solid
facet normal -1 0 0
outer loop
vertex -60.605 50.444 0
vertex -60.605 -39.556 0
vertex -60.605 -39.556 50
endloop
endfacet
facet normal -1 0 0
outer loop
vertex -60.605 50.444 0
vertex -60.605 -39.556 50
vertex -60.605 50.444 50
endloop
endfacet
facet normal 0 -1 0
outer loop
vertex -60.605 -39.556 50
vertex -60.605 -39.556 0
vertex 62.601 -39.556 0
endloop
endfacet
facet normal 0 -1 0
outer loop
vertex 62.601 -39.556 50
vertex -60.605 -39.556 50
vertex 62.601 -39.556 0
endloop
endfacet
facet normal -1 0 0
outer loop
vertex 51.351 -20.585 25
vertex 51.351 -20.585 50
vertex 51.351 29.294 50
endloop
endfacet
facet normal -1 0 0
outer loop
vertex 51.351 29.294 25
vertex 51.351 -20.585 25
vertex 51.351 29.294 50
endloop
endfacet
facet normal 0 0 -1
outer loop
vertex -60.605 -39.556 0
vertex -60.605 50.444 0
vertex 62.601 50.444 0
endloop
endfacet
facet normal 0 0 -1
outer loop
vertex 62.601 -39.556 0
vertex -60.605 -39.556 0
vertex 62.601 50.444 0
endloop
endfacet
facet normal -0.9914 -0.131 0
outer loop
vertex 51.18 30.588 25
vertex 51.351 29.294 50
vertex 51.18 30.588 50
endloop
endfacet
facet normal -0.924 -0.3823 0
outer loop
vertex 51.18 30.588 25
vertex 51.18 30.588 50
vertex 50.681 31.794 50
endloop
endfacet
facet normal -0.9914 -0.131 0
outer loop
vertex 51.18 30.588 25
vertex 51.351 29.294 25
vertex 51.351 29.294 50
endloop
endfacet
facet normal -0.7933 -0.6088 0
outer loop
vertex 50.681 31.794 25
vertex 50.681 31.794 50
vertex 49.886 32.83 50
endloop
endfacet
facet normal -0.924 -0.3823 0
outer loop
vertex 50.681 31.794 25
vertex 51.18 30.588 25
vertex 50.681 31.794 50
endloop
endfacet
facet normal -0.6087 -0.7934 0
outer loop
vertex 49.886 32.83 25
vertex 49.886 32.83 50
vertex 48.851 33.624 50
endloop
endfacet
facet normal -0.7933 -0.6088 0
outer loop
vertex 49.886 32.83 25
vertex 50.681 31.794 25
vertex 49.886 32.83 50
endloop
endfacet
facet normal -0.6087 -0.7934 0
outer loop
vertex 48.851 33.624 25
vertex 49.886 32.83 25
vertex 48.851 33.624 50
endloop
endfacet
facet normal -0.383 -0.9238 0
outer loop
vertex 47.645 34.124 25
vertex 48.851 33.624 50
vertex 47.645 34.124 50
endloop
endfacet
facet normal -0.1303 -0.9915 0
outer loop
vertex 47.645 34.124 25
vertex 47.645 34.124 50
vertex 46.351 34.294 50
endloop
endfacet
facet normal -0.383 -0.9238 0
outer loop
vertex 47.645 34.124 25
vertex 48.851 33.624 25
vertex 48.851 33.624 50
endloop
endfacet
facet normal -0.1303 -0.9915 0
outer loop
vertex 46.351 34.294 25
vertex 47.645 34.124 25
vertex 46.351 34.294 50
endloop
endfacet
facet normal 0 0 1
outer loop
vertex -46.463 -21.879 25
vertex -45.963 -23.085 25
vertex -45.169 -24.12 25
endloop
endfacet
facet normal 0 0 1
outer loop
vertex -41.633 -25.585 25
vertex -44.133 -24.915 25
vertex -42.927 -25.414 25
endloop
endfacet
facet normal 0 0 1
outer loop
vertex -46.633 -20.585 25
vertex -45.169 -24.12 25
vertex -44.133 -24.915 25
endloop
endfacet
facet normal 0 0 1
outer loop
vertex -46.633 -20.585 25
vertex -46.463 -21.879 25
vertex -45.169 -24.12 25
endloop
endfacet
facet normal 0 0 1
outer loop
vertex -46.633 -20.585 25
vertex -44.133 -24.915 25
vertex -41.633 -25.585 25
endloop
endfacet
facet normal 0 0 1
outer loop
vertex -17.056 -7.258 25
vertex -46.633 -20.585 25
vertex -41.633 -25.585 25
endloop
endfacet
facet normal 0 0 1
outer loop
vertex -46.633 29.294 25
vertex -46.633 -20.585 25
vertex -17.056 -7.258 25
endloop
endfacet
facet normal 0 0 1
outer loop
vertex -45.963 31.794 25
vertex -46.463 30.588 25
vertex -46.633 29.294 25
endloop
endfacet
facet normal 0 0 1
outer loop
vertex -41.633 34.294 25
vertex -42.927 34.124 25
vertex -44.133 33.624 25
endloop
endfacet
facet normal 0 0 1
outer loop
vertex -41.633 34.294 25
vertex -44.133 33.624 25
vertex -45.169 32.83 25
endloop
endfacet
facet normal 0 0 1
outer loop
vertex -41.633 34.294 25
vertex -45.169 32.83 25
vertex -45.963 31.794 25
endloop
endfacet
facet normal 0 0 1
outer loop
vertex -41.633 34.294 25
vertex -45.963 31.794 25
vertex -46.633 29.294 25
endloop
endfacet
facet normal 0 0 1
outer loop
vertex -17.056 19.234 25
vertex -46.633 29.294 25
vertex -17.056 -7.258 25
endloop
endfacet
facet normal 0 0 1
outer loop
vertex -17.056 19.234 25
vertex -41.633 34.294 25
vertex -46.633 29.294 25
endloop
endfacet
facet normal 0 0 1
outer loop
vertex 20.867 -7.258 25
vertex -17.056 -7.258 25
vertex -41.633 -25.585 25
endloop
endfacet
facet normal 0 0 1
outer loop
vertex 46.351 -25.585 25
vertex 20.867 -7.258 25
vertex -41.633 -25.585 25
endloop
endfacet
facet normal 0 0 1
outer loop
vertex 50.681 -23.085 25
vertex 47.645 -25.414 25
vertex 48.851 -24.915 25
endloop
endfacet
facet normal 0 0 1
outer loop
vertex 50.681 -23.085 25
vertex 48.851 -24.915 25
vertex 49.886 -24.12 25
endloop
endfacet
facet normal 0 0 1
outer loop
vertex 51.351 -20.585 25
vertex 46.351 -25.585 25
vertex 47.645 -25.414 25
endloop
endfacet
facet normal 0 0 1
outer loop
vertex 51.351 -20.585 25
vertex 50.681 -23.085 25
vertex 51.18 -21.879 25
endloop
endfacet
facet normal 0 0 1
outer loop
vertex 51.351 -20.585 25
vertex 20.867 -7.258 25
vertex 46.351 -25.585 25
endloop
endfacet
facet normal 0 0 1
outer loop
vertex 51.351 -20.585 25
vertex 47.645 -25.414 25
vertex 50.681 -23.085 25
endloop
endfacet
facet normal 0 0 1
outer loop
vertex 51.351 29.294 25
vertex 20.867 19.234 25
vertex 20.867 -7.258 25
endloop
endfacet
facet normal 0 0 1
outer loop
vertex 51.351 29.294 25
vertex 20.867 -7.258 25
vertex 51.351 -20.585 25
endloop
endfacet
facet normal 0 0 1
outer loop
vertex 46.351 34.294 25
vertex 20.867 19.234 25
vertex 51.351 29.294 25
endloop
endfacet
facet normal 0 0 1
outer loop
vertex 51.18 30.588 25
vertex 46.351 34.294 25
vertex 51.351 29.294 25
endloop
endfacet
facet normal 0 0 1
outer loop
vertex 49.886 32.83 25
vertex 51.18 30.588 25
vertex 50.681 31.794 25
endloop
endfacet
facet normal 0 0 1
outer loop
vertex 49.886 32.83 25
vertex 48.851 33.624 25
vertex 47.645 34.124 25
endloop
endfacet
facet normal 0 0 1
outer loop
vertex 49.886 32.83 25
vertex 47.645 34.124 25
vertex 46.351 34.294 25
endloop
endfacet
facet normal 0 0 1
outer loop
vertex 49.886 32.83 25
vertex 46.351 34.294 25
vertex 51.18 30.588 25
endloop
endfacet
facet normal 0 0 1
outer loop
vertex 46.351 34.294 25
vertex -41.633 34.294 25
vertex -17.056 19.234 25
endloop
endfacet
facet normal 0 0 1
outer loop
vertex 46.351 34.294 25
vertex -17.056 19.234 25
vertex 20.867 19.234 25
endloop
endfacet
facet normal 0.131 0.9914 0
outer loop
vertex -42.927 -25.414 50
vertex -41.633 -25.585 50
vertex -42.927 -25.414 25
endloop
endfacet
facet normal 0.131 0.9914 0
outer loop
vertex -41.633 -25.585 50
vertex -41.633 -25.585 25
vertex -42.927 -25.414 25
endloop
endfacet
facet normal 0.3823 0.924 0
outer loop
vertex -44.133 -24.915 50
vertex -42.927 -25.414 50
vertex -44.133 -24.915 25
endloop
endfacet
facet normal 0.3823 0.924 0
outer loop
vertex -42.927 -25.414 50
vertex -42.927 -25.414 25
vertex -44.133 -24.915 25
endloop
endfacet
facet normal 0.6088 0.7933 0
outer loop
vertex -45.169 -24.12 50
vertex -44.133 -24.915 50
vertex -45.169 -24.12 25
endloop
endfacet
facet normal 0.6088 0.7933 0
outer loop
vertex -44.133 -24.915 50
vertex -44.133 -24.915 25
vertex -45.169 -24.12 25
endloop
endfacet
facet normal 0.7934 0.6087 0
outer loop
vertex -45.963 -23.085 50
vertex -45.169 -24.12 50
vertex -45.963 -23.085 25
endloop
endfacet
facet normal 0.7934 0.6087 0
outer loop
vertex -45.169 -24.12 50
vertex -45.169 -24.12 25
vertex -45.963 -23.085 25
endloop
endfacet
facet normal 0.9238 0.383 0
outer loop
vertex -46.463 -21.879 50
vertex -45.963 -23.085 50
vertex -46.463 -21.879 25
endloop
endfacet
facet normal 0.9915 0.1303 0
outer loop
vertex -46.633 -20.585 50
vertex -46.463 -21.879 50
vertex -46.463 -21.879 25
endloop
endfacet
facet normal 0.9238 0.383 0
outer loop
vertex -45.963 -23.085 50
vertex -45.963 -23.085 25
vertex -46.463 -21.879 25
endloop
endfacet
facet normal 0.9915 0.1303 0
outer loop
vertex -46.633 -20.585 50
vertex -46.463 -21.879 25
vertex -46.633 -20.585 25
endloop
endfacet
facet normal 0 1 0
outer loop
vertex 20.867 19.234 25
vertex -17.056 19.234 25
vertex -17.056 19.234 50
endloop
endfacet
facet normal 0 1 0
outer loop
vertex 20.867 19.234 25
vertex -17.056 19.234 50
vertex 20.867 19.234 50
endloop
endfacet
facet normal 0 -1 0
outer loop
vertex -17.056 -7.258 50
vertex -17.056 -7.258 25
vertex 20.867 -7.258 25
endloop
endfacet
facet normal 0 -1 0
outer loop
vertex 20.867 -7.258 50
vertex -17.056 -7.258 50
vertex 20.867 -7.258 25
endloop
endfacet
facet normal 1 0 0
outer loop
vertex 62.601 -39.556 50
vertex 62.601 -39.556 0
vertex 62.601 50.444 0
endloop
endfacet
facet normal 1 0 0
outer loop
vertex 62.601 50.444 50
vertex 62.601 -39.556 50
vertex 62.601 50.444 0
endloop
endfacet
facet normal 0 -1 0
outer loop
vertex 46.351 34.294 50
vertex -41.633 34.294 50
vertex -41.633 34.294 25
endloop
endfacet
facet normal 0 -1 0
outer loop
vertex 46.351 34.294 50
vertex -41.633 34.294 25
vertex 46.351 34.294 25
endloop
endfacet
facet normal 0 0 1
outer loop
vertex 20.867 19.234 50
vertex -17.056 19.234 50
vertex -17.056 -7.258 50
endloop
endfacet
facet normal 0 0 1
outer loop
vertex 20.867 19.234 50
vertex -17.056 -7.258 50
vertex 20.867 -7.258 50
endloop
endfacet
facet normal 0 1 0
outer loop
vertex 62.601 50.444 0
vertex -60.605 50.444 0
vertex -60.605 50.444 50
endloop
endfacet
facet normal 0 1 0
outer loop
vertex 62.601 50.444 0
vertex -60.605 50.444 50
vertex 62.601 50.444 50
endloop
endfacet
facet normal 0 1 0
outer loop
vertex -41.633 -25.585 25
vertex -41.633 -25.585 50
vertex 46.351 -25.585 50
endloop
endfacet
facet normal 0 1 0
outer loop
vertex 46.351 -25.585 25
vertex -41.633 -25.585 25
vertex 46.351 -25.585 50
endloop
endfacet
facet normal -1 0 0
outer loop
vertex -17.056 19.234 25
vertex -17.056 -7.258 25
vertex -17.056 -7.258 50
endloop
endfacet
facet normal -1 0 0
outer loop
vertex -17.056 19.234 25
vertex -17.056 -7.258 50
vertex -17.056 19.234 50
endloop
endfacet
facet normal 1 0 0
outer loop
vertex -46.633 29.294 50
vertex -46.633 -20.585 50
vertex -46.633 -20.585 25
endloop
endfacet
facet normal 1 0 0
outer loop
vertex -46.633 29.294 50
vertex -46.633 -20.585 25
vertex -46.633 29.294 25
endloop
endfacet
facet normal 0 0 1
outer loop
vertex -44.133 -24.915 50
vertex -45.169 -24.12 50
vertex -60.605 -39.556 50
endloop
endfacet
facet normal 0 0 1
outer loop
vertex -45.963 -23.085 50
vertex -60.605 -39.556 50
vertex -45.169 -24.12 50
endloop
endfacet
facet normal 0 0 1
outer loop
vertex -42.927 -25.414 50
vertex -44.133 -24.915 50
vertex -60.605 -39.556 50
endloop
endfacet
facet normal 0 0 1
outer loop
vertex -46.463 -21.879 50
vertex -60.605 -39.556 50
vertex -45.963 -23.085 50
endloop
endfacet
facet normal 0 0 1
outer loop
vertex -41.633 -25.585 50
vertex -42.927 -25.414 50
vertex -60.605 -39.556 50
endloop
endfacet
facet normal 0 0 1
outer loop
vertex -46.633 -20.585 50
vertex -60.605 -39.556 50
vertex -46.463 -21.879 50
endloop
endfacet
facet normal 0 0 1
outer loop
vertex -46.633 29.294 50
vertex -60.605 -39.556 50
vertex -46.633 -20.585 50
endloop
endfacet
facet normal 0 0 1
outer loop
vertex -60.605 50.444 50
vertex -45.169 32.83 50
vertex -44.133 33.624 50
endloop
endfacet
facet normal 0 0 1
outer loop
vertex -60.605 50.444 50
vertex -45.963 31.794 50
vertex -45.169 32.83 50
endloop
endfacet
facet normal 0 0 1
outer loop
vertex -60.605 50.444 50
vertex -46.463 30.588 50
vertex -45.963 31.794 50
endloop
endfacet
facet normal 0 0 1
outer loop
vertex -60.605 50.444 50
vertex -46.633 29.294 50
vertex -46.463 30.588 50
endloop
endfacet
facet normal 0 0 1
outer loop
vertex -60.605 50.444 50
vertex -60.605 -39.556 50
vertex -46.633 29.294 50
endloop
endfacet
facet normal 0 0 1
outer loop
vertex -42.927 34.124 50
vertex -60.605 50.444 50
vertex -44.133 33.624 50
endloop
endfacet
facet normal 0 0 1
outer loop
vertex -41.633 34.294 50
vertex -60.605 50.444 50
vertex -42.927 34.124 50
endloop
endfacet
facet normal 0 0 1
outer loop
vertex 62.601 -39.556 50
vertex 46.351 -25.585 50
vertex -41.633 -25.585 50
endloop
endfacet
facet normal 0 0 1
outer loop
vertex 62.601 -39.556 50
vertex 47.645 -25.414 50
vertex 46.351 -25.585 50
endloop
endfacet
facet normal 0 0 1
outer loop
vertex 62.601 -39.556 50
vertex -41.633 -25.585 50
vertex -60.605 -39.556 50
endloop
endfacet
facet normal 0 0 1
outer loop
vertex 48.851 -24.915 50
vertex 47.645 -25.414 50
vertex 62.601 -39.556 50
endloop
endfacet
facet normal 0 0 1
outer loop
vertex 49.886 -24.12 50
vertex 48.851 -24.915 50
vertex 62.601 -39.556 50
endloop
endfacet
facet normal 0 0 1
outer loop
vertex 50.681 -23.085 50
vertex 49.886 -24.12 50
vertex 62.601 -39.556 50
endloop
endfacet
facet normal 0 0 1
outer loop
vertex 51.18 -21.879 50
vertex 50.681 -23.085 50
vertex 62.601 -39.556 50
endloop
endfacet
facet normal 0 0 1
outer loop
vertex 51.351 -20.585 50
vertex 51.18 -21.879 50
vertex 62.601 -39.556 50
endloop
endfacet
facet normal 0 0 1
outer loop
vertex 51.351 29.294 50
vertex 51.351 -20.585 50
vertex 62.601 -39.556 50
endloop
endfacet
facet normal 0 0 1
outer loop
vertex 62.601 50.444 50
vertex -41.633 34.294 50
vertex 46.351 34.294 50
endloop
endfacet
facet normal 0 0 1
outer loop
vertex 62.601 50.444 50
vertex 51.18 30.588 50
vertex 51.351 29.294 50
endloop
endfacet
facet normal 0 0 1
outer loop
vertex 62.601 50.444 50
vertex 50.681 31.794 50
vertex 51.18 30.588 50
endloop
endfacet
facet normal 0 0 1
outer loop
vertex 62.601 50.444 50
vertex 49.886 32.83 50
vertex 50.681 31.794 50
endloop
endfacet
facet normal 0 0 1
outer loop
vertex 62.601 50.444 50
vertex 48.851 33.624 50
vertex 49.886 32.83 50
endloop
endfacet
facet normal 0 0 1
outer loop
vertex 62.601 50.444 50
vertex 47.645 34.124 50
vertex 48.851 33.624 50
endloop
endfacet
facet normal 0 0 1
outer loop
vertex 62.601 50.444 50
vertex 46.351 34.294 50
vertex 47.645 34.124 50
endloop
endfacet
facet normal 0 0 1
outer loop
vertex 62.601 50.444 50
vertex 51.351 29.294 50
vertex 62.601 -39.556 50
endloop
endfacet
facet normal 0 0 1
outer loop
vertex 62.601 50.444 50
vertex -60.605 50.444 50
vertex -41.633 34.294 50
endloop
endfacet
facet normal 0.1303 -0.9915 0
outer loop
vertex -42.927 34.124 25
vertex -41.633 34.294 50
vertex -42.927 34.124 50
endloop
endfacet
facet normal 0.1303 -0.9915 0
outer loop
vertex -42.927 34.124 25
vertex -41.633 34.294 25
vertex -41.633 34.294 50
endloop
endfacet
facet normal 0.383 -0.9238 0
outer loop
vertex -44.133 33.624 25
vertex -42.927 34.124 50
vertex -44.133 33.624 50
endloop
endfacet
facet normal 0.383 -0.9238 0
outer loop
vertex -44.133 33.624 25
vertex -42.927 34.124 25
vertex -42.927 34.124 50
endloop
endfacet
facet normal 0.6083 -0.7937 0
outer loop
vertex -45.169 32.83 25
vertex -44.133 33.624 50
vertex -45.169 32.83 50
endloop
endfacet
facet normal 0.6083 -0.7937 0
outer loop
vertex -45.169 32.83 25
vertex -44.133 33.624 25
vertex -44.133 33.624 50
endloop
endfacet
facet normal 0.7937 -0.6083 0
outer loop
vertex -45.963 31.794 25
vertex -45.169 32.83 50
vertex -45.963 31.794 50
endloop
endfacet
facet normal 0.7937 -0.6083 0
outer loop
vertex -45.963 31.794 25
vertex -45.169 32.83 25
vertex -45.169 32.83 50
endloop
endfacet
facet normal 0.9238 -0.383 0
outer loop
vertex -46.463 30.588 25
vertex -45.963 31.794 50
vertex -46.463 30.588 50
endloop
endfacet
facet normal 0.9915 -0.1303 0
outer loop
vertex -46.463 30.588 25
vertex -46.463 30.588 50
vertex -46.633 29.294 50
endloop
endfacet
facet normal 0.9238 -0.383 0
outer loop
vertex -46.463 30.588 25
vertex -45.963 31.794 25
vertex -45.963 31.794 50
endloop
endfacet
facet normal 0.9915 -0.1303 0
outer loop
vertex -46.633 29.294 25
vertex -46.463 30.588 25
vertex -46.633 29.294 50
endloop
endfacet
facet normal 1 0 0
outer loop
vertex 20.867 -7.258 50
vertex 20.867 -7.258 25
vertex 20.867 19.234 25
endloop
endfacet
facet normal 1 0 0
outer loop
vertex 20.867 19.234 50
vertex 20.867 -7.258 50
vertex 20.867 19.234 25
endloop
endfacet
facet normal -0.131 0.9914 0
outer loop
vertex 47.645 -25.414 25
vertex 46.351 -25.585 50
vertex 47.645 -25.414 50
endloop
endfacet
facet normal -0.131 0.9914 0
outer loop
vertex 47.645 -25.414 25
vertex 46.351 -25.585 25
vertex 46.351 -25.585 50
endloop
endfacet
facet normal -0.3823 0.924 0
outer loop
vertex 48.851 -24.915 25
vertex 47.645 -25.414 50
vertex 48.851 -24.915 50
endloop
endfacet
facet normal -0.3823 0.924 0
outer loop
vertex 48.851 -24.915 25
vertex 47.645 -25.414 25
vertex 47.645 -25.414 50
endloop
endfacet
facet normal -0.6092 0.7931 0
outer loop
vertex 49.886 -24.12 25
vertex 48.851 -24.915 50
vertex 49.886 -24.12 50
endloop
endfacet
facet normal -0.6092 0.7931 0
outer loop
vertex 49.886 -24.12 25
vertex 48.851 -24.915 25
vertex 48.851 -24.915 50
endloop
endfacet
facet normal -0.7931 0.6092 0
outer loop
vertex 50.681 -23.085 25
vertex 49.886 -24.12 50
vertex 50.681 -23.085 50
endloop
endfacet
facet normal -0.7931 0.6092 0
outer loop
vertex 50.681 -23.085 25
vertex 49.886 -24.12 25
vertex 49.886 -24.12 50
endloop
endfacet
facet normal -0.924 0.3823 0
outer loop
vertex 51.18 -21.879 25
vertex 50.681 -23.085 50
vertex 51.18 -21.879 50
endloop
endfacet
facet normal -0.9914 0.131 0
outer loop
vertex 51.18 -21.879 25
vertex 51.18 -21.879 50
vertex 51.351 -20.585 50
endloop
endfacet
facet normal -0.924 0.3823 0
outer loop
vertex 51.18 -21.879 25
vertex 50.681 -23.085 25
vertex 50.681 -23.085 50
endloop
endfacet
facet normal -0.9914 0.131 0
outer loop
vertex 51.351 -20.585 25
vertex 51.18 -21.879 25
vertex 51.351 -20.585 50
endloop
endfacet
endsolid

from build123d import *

# Parameters (mm, degrees)
F0_W     = 123.205647
F0_H     = 90
F1_DEPTH = 50
F2_W     = 97.983871
F2_H     = 59.879035
F3_DEPTH = 25
F4_W     = 37.923388
F4_H     = 26.491936
F5_DEPTH = 25
F6_R     = 5


with BuildPart() as f1:
    # F0 (on Top) → F1 (new body)
    with BuildSketch(Plane.XY):
        with Locations((0.997982, 5.443549)):
            Rectangle(F0_W, F0_H)
    extrude(amount=F1_DEPTH)

    # F2 (on face) → F3 (cut)
    with BuildSketch(Plane.XY.offset(50)):
        with Locations((2.358871, 4.354839)):
            Rectangle(F2_W, F2_H)
    extrude(amount=-F3_DEPTH, mode=Mode.SUBTRACT)

    # F4 (on face) → F5 (join)
    with BuildSketch(Plane.XY.offset(25)):
        with Locations((1.905242, 5.987903)):
            Rectangle(F4_W, F4_H)
    extrude(amount=F5_DEPTH)

    # F6
    f6_edges = [f1.edges().sort_by_distance(p)[0] for p in [
        (-46.633065, 34.294356, 37.5),
        (-46.633065, -25.584679, 37.5),
        (51.350806, -25.584679, 37.5),
        (51.350806, 34.294356, 37.5),
    ]]
    fillet(f6_edges, radius=F6_R)


solid = f1.part
